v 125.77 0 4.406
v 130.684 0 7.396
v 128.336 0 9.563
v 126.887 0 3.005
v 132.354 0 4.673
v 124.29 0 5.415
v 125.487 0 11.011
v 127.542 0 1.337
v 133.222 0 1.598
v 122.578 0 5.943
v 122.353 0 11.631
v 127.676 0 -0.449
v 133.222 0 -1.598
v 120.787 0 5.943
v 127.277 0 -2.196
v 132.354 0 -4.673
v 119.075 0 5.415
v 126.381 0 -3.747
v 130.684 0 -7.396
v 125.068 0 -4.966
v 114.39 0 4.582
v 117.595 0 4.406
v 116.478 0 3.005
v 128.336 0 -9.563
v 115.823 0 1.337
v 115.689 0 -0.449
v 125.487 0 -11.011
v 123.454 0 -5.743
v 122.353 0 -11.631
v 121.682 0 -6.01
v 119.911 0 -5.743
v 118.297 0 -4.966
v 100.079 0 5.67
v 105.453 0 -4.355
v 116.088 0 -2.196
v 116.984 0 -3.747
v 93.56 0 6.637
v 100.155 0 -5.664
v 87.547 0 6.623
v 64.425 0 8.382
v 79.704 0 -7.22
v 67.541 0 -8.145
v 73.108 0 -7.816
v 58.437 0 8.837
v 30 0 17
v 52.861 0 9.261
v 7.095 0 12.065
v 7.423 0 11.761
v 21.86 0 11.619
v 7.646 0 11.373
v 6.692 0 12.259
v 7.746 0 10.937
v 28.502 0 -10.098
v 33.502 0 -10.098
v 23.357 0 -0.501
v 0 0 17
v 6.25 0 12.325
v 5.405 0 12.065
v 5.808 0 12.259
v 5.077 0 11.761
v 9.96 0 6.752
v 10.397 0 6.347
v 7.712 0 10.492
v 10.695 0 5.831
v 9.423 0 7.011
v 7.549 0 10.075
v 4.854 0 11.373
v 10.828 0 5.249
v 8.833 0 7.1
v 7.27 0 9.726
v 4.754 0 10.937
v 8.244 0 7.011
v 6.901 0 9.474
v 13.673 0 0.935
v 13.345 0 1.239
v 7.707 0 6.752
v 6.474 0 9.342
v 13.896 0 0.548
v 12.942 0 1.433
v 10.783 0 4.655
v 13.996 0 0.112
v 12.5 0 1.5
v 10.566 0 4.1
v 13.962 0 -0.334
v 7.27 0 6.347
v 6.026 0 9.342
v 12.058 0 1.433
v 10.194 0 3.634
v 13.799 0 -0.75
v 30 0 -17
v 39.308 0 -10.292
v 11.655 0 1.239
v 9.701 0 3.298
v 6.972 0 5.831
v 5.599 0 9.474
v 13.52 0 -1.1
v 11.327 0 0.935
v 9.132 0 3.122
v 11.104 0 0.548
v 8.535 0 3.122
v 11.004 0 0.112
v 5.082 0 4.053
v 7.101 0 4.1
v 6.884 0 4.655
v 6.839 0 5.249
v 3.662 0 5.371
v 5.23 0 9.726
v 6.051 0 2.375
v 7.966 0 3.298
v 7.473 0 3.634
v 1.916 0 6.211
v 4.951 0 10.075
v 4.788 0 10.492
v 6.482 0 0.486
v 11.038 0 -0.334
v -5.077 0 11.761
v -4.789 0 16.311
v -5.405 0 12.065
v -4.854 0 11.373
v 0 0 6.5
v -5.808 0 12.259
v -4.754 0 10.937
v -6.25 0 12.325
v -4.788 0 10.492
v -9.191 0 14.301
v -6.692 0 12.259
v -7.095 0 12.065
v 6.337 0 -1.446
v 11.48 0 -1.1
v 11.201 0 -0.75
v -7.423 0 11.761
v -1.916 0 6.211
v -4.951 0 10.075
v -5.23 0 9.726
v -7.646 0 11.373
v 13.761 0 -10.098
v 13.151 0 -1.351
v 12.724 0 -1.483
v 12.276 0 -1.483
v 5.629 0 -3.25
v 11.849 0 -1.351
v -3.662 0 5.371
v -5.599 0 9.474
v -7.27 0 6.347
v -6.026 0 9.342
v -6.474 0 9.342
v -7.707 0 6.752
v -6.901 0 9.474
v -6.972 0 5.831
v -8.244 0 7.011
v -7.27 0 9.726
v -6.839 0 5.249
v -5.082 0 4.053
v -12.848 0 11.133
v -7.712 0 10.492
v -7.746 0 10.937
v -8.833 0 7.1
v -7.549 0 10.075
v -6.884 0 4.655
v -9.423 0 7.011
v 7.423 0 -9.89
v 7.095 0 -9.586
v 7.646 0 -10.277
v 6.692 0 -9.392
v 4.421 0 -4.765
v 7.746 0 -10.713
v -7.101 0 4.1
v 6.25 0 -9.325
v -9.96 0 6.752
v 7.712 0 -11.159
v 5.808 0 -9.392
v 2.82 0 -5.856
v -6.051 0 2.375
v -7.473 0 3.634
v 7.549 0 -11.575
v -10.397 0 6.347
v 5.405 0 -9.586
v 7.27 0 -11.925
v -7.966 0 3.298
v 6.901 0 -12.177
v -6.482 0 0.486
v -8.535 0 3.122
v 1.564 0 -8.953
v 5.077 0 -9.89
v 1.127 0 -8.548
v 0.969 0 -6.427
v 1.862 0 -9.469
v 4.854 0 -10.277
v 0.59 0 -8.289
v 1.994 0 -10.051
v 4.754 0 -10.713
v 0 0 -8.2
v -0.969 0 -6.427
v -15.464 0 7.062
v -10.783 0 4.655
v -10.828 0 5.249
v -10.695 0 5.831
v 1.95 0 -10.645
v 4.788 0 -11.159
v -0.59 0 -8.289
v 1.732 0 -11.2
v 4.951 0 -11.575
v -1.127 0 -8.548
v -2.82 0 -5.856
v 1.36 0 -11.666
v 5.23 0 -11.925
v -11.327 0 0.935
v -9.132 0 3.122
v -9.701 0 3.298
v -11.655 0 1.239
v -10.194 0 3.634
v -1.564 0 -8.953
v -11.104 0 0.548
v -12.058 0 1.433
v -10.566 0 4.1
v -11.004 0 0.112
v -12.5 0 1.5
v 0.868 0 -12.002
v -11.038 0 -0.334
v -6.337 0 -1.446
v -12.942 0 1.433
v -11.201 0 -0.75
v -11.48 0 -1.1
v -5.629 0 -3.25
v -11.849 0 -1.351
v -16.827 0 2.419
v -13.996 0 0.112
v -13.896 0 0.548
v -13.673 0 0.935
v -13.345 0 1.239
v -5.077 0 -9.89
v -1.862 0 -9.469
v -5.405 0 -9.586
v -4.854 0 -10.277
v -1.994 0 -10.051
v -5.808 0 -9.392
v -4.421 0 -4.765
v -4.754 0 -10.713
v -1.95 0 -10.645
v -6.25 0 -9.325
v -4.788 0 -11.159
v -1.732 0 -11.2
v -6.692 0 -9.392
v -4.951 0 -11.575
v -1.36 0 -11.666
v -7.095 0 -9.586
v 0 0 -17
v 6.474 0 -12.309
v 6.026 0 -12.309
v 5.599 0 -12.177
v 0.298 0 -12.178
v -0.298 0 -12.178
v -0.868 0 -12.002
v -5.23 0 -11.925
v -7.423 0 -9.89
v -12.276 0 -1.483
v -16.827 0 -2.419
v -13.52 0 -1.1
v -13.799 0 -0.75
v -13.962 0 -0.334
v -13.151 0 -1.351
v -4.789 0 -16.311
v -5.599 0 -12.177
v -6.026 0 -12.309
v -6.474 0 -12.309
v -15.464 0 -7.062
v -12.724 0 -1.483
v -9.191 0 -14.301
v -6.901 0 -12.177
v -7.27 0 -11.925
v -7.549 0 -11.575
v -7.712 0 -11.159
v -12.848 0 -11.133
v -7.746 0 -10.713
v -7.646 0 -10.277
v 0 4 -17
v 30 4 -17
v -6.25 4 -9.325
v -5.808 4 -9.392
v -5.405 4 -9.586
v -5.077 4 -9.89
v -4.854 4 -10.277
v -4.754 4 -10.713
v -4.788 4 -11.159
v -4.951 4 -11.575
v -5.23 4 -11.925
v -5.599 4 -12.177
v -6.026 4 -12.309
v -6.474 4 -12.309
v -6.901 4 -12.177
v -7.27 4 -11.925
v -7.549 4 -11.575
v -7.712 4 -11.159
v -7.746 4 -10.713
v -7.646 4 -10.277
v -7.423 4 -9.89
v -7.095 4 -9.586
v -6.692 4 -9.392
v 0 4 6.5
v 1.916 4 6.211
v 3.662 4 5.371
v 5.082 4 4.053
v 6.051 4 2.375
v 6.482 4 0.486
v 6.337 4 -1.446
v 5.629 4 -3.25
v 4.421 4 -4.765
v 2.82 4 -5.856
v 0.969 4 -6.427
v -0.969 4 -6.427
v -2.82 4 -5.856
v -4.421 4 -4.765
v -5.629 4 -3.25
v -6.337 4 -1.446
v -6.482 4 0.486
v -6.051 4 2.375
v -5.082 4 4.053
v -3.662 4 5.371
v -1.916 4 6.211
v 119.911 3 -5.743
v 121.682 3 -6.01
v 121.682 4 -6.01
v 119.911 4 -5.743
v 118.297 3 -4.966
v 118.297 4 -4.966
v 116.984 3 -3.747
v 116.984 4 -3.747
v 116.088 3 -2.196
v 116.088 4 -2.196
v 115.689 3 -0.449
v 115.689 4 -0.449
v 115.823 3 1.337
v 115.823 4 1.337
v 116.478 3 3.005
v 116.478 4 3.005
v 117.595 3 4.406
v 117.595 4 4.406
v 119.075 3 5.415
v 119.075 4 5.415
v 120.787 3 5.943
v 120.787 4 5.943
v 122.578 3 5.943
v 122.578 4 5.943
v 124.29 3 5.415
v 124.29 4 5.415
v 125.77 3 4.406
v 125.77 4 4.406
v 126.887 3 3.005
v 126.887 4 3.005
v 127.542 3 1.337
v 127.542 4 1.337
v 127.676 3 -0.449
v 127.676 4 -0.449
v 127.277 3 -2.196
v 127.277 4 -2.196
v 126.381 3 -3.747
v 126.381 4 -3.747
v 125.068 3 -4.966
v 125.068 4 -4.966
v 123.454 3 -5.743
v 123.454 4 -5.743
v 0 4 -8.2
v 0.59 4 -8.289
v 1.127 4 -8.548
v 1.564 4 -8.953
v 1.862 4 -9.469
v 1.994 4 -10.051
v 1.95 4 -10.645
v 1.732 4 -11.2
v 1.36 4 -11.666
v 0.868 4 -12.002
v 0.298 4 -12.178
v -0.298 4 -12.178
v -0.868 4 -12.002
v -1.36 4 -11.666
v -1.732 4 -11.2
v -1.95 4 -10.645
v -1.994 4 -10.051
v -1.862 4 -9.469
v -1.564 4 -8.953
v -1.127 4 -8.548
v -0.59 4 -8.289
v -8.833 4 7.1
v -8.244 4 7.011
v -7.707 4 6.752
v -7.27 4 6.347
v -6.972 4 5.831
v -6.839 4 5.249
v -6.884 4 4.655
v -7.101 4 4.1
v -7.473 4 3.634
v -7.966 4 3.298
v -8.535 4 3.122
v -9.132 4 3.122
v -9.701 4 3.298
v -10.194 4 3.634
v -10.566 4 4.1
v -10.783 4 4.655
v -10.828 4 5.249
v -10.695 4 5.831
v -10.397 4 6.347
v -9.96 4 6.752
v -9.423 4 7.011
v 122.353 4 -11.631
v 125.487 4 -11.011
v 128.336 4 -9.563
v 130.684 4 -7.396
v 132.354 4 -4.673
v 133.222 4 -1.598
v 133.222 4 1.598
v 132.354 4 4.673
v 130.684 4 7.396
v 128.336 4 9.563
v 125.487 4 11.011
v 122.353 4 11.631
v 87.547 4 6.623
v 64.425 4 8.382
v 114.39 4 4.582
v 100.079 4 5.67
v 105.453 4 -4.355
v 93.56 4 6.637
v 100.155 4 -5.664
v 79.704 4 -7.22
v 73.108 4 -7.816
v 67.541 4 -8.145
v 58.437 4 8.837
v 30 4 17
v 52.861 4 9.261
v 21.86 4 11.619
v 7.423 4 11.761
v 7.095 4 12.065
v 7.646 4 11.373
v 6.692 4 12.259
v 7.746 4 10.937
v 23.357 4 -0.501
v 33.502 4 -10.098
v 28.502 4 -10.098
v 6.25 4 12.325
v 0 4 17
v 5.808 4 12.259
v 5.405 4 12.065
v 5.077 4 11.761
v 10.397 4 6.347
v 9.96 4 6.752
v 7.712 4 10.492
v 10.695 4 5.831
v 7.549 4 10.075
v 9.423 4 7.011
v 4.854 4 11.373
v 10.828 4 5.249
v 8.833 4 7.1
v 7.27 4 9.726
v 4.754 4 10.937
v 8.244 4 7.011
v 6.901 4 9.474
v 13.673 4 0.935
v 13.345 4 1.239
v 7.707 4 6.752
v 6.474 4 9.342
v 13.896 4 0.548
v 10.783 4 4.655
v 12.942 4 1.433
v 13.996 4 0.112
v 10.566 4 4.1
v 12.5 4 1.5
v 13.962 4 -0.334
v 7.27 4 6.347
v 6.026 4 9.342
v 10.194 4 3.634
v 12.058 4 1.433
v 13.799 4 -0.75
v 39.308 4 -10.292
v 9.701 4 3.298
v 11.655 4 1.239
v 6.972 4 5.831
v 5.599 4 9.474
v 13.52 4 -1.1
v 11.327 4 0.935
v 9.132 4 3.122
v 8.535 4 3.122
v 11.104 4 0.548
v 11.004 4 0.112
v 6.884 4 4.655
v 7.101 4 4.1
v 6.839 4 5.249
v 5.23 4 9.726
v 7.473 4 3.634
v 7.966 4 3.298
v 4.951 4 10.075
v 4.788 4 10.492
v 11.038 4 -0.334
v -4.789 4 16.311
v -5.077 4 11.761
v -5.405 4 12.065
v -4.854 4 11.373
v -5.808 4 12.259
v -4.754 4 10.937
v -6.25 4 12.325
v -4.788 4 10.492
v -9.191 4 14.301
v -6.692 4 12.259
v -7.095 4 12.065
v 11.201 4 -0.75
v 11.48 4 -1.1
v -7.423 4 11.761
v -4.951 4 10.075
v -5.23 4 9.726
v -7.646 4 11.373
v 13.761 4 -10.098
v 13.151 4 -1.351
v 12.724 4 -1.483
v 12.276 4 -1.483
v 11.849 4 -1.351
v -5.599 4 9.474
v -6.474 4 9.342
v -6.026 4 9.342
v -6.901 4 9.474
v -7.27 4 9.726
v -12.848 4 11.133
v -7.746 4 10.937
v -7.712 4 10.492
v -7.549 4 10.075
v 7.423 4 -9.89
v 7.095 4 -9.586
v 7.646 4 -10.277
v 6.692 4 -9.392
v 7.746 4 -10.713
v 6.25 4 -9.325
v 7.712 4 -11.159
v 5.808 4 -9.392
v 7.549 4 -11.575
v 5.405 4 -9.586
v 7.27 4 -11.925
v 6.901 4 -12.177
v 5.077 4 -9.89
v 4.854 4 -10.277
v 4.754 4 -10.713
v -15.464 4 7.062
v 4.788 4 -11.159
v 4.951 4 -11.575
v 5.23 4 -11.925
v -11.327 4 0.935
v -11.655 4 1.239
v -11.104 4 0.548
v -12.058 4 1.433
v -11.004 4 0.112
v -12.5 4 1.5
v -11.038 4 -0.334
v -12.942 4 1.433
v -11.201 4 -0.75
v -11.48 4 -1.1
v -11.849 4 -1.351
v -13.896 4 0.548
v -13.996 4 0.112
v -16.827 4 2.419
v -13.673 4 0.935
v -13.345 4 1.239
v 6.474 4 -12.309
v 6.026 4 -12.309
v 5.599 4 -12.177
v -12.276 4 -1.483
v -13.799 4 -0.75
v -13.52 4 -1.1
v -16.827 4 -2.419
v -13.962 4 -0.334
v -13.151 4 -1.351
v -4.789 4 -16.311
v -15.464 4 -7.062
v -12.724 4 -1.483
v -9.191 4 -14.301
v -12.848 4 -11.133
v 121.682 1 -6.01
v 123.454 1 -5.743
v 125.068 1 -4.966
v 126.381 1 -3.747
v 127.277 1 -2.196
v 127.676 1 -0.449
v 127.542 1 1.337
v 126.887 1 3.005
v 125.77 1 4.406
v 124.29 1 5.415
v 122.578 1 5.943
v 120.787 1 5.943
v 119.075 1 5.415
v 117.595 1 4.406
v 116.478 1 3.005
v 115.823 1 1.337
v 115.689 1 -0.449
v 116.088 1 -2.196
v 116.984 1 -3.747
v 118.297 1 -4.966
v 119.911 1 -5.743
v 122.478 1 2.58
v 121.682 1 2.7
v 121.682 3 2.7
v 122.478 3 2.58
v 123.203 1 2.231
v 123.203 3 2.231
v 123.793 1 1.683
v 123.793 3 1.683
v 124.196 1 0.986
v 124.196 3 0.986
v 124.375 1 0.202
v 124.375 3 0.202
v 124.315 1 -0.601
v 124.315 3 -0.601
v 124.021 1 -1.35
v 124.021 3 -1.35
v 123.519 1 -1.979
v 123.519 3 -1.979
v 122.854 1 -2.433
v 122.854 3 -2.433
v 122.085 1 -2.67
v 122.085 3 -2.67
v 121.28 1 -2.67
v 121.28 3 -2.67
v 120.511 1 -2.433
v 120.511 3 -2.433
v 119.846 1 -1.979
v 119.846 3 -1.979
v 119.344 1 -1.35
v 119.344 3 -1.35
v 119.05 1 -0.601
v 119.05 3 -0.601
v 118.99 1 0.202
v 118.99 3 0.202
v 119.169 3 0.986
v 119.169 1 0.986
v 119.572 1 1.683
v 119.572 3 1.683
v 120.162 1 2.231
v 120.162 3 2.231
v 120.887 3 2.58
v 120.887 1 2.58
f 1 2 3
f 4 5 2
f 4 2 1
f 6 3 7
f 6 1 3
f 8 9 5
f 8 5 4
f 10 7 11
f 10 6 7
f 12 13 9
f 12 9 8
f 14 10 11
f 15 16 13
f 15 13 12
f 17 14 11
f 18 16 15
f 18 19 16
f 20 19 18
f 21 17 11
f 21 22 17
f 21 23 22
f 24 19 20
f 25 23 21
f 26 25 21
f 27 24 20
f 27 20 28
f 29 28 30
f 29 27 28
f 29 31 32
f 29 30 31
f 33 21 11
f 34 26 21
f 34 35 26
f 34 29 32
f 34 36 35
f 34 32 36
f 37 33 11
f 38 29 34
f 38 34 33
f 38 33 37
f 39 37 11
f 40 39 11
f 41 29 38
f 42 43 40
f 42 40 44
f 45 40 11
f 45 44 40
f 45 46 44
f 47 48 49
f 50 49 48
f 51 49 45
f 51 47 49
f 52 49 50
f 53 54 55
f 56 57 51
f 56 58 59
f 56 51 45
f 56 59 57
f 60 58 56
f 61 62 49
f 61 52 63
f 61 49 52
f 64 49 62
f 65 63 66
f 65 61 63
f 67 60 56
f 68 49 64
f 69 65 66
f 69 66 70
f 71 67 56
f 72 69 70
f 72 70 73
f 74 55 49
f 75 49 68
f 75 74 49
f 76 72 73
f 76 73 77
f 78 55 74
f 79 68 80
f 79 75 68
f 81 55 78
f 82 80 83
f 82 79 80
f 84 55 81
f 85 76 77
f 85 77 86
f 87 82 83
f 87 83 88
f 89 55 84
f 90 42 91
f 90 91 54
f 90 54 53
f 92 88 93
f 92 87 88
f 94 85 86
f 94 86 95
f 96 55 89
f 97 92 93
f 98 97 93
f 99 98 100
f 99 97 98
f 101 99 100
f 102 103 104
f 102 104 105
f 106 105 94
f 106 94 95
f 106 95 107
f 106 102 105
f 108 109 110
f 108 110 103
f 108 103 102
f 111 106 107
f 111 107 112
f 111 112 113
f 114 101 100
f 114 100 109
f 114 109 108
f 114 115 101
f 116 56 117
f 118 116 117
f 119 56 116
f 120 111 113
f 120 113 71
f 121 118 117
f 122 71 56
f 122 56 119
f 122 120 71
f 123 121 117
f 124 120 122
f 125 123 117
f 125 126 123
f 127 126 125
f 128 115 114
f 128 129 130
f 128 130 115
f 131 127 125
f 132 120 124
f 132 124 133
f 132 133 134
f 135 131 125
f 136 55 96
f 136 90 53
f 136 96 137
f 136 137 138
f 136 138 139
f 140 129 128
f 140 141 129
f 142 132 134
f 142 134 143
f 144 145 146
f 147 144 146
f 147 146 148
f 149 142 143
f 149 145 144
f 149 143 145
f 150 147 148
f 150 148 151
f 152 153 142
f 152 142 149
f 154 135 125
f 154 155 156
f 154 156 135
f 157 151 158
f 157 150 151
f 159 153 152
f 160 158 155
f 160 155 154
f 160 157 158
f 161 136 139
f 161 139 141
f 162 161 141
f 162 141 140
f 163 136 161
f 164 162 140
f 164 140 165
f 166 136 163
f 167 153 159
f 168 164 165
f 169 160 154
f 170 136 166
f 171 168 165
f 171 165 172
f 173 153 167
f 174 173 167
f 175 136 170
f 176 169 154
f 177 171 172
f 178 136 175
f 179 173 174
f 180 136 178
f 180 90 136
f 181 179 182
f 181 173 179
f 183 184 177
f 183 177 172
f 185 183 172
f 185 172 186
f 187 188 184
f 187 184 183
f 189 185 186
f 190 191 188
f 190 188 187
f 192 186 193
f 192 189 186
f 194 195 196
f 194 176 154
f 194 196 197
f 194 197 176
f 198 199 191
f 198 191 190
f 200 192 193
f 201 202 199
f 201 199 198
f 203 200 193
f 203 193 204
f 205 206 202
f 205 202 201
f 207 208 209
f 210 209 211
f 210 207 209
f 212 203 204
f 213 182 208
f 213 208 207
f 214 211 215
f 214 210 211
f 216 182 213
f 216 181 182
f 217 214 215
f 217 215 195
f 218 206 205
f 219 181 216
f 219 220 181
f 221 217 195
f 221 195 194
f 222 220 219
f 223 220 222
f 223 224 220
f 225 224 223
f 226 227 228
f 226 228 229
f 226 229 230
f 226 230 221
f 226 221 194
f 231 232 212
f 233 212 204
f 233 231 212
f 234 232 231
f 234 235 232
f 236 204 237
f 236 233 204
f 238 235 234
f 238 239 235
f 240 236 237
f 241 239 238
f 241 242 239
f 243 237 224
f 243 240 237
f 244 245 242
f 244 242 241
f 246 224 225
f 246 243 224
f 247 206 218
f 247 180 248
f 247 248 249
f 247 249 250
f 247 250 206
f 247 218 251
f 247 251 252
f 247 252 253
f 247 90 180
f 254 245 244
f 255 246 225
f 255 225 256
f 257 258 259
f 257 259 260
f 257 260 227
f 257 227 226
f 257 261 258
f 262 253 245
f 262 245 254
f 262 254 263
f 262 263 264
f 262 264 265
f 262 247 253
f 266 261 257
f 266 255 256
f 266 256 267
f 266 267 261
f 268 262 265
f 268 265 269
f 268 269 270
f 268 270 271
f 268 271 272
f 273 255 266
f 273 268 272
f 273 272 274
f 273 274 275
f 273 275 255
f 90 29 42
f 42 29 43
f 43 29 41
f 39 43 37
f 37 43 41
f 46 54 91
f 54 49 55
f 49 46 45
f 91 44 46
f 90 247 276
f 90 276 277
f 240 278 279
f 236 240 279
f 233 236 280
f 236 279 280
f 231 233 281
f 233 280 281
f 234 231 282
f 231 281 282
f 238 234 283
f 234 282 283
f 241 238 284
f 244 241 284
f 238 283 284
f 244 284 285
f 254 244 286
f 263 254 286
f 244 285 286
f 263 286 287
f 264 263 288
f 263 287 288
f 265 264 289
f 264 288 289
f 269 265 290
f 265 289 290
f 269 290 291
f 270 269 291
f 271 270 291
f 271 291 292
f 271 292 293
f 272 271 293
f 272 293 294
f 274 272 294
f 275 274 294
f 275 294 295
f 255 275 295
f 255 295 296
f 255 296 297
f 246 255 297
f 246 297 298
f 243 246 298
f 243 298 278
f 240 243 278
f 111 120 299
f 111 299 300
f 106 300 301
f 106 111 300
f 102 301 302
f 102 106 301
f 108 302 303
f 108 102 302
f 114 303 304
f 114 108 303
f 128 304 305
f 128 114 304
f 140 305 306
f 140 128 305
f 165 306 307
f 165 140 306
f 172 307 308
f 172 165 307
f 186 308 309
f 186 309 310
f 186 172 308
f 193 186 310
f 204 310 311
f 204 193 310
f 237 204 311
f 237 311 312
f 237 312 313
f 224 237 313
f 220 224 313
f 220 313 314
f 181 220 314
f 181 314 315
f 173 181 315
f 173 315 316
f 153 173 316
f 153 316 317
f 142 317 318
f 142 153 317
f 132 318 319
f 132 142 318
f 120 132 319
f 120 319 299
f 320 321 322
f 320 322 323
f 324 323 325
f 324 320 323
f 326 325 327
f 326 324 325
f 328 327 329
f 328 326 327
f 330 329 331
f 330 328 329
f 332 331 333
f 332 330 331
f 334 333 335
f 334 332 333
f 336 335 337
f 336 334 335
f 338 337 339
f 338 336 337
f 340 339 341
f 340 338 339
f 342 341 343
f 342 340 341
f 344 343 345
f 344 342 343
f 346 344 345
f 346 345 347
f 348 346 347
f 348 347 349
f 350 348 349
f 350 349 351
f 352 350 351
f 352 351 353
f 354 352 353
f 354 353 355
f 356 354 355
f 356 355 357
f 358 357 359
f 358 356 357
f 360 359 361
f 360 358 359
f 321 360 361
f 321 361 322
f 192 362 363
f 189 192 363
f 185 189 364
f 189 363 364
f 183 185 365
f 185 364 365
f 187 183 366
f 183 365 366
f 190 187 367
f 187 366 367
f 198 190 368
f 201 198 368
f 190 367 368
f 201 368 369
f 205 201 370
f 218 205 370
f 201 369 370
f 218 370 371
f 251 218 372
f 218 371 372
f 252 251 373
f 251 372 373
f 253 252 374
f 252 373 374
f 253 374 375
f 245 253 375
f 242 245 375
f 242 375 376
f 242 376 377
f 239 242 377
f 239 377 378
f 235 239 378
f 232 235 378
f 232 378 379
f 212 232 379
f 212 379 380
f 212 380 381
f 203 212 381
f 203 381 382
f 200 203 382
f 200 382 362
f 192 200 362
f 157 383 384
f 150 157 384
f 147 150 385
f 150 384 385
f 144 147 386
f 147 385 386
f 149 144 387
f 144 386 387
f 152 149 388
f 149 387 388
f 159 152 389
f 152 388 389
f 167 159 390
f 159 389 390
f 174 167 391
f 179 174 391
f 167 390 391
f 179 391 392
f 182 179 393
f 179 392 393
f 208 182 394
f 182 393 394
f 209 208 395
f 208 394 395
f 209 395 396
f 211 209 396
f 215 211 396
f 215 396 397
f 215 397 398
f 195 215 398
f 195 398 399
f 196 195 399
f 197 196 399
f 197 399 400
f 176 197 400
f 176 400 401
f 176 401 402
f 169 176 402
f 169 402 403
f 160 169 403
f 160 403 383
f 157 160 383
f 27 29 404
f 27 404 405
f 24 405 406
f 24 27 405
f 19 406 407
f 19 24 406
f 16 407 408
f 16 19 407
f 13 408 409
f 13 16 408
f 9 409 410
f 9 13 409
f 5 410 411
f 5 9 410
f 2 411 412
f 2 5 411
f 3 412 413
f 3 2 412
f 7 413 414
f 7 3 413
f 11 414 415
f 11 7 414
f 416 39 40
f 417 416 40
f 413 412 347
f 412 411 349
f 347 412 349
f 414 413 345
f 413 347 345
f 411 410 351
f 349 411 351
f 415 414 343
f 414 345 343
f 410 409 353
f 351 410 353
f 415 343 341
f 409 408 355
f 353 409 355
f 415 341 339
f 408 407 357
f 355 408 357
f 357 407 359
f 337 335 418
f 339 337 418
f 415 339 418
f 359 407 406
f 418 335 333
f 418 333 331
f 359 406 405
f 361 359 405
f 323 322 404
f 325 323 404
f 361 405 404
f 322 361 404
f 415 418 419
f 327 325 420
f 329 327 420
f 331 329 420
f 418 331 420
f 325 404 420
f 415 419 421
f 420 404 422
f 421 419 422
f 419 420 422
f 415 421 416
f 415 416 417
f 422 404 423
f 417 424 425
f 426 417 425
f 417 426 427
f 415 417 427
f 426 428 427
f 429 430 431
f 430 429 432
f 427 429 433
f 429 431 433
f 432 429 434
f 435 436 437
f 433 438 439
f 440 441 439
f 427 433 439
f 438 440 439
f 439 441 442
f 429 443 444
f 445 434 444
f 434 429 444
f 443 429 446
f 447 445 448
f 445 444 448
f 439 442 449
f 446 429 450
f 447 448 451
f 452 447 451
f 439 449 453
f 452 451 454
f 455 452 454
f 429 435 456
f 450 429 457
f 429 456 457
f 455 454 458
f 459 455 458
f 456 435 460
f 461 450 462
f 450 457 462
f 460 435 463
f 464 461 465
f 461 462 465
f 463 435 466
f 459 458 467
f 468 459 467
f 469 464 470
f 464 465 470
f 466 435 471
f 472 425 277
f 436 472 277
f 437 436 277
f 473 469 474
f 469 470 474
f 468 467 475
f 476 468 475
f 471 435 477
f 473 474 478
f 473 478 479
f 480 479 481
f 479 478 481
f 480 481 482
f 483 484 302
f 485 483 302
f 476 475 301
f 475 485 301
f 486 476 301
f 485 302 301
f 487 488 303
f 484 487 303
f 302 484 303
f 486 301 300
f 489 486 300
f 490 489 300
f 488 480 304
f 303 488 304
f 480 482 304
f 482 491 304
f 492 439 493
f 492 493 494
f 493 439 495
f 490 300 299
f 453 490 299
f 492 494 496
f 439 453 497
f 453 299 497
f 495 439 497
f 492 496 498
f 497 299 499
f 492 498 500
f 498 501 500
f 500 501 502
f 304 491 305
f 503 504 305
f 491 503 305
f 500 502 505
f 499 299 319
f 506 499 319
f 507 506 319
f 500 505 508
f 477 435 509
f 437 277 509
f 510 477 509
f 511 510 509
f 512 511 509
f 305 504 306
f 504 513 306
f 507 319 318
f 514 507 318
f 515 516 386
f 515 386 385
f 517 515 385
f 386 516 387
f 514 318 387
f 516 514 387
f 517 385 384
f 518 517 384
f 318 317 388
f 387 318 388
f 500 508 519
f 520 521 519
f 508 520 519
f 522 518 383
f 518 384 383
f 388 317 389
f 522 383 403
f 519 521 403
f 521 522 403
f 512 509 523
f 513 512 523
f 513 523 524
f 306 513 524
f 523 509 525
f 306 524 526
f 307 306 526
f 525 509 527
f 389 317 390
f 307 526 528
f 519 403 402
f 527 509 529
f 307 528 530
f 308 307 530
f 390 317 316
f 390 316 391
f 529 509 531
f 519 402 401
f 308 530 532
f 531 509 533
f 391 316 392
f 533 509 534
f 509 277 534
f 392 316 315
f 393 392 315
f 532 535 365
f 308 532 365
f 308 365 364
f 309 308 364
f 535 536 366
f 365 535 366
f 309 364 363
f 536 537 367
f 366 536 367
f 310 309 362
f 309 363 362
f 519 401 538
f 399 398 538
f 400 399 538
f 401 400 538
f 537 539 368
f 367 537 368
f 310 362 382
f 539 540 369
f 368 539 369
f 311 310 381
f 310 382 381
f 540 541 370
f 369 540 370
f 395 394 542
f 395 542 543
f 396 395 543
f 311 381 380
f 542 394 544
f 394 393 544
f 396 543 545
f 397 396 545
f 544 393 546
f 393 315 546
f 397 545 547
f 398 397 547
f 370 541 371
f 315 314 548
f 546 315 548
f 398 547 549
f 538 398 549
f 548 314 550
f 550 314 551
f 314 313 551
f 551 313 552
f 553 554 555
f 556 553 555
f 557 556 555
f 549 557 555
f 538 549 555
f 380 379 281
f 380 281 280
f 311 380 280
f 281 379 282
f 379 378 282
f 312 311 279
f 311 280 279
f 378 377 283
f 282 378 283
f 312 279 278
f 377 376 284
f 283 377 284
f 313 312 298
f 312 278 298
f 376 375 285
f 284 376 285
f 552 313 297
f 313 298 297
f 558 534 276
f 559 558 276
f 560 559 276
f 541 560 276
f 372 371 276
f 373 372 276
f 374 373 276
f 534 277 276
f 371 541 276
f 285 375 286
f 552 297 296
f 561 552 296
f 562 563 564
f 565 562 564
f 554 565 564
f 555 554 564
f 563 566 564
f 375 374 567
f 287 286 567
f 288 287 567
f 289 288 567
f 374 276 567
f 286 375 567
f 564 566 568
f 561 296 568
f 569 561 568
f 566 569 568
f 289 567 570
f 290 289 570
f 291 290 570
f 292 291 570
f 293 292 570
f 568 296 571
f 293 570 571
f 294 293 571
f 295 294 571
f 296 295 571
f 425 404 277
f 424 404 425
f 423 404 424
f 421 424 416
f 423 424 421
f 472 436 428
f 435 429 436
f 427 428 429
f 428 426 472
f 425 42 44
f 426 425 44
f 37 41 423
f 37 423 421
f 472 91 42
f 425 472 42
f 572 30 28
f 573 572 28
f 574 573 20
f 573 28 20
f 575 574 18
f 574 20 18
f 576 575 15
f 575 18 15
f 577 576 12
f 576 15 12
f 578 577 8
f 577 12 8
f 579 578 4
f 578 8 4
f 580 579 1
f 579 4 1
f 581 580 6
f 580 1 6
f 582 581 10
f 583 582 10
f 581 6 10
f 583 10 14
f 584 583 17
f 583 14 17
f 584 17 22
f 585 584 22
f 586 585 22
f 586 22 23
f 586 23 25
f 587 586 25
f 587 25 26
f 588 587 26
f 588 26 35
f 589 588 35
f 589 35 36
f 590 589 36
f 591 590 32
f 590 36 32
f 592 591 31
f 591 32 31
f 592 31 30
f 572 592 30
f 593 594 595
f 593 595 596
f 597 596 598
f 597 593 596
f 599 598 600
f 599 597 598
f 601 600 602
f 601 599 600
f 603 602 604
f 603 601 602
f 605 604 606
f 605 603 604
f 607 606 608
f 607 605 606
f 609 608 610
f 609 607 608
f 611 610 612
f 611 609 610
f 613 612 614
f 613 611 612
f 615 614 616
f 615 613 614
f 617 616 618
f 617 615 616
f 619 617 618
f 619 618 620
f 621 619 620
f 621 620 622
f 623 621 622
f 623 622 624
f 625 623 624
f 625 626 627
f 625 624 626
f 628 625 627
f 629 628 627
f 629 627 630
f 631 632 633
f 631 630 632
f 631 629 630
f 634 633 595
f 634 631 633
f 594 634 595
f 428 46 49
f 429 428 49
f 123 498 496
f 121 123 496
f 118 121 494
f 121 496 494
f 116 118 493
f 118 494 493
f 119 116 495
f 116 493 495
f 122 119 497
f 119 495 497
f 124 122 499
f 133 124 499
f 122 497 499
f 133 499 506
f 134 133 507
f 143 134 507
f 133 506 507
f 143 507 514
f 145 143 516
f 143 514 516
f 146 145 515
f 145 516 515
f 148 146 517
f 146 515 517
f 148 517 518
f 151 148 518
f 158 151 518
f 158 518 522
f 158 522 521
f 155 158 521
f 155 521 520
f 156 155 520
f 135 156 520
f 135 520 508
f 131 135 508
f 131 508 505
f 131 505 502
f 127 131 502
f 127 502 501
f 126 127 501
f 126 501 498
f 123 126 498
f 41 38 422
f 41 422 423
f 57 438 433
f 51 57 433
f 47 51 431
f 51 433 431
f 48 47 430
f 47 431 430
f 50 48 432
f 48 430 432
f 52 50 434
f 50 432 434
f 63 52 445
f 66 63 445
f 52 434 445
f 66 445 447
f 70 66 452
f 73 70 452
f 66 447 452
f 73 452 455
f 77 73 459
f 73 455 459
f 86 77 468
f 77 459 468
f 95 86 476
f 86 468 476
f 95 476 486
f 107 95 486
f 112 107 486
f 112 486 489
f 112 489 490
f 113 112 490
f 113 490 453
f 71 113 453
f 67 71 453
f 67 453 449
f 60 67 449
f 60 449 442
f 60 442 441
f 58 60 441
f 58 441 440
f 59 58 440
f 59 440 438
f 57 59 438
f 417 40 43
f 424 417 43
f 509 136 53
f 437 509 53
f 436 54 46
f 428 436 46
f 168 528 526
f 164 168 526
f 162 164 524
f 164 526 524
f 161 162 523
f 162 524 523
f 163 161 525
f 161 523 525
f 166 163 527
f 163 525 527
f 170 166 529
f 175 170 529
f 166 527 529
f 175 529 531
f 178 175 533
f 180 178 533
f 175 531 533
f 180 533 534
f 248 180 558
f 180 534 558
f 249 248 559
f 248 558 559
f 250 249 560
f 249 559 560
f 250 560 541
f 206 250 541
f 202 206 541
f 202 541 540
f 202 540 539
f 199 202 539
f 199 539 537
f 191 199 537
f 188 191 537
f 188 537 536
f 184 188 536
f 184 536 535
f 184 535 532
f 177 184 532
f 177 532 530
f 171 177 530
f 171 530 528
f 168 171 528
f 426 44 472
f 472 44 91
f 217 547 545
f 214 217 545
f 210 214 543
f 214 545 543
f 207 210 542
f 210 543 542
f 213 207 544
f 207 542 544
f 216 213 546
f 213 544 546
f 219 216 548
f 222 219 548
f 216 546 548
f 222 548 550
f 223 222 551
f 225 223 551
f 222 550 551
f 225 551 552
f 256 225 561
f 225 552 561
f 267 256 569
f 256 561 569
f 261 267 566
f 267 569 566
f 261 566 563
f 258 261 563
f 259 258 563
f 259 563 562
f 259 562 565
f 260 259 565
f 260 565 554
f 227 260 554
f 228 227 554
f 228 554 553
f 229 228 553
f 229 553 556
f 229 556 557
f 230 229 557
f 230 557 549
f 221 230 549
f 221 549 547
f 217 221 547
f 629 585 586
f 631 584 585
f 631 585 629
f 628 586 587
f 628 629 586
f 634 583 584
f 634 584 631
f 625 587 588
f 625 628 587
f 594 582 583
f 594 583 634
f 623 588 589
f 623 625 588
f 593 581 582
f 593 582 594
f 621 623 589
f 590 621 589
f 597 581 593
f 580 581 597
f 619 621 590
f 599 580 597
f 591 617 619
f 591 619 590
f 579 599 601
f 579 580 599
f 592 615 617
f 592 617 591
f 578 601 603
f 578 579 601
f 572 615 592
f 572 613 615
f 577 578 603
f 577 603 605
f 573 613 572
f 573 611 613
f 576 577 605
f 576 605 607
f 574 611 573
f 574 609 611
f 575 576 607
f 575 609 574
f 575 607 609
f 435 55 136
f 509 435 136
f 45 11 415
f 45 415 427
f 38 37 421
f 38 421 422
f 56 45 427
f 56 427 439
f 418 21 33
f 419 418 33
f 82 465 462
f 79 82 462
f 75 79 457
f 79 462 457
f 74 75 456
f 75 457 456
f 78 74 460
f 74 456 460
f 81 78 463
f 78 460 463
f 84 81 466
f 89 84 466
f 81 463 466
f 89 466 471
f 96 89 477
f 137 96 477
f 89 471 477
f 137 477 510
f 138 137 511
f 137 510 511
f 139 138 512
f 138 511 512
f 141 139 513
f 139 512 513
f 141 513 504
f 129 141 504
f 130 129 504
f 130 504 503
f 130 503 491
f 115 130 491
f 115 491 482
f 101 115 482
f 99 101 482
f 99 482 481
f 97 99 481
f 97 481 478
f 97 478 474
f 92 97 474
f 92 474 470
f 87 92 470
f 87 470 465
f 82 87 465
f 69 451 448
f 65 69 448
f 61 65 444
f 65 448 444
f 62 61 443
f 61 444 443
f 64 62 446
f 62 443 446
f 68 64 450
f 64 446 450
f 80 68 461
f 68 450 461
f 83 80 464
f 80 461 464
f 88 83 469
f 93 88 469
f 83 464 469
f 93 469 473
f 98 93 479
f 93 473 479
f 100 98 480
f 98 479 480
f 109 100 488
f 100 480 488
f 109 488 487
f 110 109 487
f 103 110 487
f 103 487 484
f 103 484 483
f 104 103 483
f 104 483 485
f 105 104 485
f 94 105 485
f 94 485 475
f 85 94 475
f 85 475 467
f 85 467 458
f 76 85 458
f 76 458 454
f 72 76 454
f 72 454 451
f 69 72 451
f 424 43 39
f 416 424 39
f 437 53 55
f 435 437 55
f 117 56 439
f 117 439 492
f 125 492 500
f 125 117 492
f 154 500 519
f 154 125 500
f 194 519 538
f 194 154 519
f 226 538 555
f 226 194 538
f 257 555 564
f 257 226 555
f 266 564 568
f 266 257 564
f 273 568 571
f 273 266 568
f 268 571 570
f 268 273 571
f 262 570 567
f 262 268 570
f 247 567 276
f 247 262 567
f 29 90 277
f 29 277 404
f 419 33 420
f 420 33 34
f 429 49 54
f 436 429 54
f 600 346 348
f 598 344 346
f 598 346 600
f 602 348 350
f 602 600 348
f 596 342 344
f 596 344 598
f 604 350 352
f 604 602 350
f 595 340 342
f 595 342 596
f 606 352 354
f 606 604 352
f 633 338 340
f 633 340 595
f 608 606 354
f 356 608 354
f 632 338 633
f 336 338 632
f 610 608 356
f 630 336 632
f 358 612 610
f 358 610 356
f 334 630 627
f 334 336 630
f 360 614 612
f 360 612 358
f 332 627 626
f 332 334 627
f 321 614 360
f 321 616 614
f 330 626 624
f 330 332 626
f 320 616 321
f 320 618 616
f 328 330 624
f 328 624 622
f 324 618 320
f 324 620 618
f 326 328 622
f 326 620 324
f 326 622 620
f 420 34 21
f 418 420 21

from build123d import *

# Parameters (mm, degrees)
SKETCH_1_R          = 6.5
SKETCH_1_R_2        = 2.7
EXTRUDE_1_DEPTH     = 4
SKETCH_4_R          = 2
SKETCH_4_R_2        = 1.5
CUT_EXTRUDE_4_DEPTH = 135.471393041
SKETCH_5_R          = 6.01
CUT_EXTRUDE_5_DEPTH = 1
CUT_EXTRUDE_START   = -1
SKETCH_6_R          = 6.01
CUT_EXTRUDE_6_DEPTH = 1


with BuildPart() as part:
    # 草图1 → 凸台-拉伸1 (new body)
    with BuildSketch(Plane(origin=(0, 0, 0), x_dir=(1, 0, 0), z_dir=(0, 1, 0))):
        with BuildLine():
            Line((0, 16.99999971), (30, 16.99999971))
            Line((30, 16.99999971), (122.352686729, 11.63070719))
            ThreePointArc((122.352686729, 11.63070719), (133.3325, 0), (122.352686729, -11.63070719))
            Line((122.352686729, -11.63070719), (30, -16.99999971))
            Line((30, -16.99999971), (0, -16.99999971))
            ThreePointArc((0, -16.99999971), (-16.99999971, 0), (0, 16.99999971))
        make_face()
        with Locations(Location((0, 0, 0), (0, 0, 270))):
            Circle(SKETCH_1_R, mode=Mode.SUBTRACT)
        with Locations(Location((121.6825, 0, 0), (0, 0, 270))):
            Circle(SKETCH_1_R_2, mode=Mode.SUBTRACT)
        Polygon((33.501928657, 10.097744769), (52.860659349, -9.261358145), (21.859555817, -11.619111976), align=None, mode=Mode.SUBTRACT)
        Polygon((73.108054682, 7.815553359), (87.546682357, -6.623351936), (64.424639981, -8.381872691), align=None, mode=Mode.SUBTRACT)
        Polygon((79.703760078, 7.21983651), (93.560376125, -6.637045967), (100.155176587, 5.664427182), align=None, mode=Mode.SUBTRACT)
        Polygon((100.078676439, -5.670245314), (105.453109286, 4.354840622), (114.389620729, -4.581842649), align=None, mode=Mode.SUBTRACT)
        Polygon((39.307552848, 10.292124316), (67.540710691, 8.144883461), (58.436595957, -8.837286599), align=None, mode=Mode.SUBTRACT)
        Polygon((13.760637839, 10.097744769), (28.501928657, 10.097744769), (23.357153007, 0.501045083), align=None, mode=Mode.SUBTRACT)
    extrude(amount=EXTRUDE_1_DEPTH)

    # 草图4 → 切除-拉伸4 (cut, through all)
    with BuildSketch(Plane(origin=(0, 4, 0), x_dir=(1, 0, 0), z_dir=(0, 1, 0))):
        with Locations(Location((0, 10.2, 0), (0, 0, 270))):
            Circle(SKETCH_4_R)
        with Locations(Location((8.833459119, -5.1, 0), (0, 0, 270))):
            Circle(SKETCH_4_R)
        with Locations(Location((-8.833459119, -5.1, 0), (0, 0, 270))):
            Circle(SKETCH_4_R)
        with Locations(Location((-6.25, 10.825317547, 0), (0, 0, 270))):
            Circle(SKETCH_4_R_2)
        with Locations(Location((6.25, 10.825317547, 0), (0, 0, 270))):
            Circle(SKETCH_4_R_2)
        with Locations(Location((12.5, 0, 0), (0, 0, 270))):
            Circle(SKETCH_4_R_2)
        with Locations(Location((6.25, -10.825317547, 0), (0, 0, 270))):
            Circle(SKETCH_4_R_2)
        with Locations(Location((-6.25, -10.825317547, 0), (0, 0, 270))):
            Circle(SKETCH_4_R_2)
        with Locations(Location((-12.5, 0, 0), (0, 0, 270))):
            Circle(SKETCH_4_R_2)
    extrude(amount=-CUT_EXTRUDE_4_DEPTH, mode=Mode.SUBTRACT)

    # 草图5 → 切除-拉伸5 (cut)
    with BuildSketch(Plane.XZ):
        with Locations(Location((121.6825, 0, 0), (0, 0, 270))):
            Circle(SKETCH_5_R)
    extrude(amount=-CUT_EXTRUDE_5_DEPTH, mode=Mode.SUBTRACT)

    # 草图6 → 切除-拉伸6 (cut)
    with BuildSketch(Plane(origin=(0, 4, 0), x_dir=(1, 0, 0), z_dir=(0, 1, 0)).offset(CUT_EXTRUDE_START)):
        with Locations(Location((121.6825, 0, 0), (0, 0, 90))):
            Circle(SKETCH_6_R)
    extrude(amount=CUT_EXTRUDE_6_DEPTH, mode=Mode.SUBTRACT)


solid = part.part
